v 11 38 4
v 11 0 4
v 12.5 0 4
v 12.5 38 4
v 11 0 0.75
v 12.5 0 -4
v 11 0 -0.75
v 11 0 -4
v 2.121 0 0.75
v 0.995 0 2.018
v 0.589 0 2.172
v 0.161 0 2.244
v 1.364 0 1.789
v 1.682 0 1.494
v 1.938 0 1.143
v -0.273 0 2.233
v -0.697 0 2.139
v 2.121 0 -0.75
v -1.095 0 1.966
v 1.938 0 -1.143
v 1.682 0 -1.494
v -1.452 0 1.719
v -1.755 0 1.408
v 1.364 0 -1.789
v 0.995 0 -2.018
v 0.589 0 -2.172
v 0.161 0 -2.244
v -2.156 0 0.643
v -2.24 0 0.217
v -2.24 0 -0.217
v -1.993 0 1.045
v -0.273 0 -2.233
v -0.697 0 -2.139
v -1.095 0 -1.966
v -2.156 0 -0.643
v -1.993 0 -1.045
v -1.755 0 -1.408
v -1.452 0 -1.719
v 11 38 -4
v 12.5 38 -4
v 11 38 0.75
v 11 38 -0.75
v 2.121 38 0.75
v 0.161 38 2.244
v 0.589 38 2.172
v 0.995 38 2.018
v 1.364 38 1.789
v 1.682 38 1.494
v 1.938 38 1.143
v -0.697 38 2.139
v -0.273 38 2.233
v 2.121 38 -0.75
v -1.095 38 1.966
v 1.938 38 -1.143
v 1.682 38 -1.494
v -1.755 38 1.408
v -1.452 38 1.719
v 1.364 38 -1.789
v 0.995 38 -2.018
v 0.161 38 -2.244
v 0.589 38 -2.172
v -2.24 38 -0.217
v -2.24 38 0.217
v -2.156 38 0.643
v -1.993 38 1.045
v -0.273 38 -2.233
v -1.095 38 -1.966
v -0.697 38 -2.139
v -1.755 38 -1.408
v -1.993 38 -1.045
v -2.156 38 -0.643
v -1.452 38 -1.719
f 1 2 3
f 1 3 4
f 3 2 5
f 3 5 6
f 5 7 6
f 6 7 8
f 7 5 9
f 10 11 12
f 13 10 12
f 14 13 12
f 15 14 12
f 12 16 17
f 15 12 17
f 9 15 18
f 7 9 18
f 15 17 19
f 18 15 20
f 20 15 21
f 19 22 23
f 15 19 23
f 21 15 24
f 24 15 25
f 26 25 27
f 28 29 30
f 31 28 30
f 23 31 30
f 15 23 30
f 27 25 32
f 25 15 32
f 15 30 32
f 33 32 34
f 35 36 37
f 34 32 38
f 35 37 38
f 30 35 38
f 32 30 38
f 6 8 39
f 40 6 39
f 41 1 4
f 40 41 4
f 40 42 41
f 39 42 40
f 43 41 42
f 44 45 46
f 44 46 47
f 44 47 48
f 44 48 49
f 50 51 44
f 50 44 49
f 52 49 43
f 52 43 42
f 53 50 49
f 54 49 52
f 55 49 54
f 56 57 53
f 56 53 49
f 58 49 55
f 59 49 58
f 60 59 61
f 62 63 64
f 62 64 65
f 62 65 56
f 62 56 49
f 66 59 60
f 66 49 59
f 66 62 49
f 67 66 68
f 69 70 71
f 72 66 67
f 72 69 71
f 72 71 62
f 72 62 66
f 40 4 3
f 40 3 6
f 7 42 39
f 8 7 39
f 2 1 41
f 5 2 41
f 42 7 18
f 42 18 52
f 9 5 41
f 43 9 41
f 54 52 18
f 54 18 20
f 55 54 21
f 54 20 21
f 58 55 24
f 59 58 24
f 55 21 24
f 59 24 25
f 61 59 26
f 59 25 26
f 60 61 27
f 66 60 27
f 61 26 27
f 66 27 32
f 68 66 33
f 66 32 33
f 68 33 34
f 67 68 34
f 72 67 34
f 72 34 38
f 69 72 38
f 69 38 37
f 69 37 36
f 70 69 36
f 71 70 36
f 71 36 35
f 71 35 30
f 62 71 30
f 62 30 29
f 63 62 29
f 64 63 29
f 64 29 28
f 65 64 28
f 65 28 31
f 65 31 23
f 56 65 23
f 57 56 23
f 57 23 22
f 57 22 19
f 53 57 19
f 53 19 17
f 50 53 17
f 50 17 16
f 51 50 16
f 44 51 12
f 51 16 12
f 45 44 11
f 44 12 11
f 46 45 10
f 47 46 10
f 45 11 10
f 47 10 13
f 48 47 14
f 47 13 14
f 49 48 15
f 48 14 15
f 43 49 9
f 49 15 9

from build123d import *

# Parameters (mm, degrees)
SKETCH_1_R           = 2.25
EXTRUDE_1_DEPTH      = 38
SKETCH_2_W           = 1.5
SKETCH_2_H           = 38
EXTRUDE_2_DEPTH      = 8
EXTRUDE_2_DEPTH_BACK = 3
SKETCH_3_W           = 8
SKETCH_3_H           = 38
EXTRUDE_3_DEPTH      = 1.5


with BuildPart() as part:
    # 草圖1 → 填料-伸長1 (new body)
    with BuildSketch(Plane(origin=(0, 0, 0), x_dir=(1, 0, 0), z_dir=(0, 1, 0))):
        Circle(SKETCH_1_R)
    extrude(amount=EXTRUDE_1_DEPTH)

    # 草圖2 → 填料-伸長2 (add, two sides)
    with BuildSketch(Plane(origin=(3, 0, 0), x_dir=(0, 0, -1), z_dir=(1, 0, 0))) as extrude_2_sk:
        with Locations((0, 19)):
            Rectangle(SKETCH_2_W, SKETCH_2_H)
    extrude(amount=EXTRUDE_2_DEPTH)
    extrude(extrude_2_sk.sketch, amount=-EXTRUDE_2_DEPTH_BACK)

    # 草圖3 → 填料-伸長3 (add)
    with BuildSketch(Plane(origin=(11, 0, 0), x_dir=(0, 0, -1), z_dir=(1, 0, 0))):
        with Locations((0, 19)):
            Rectangle(SKETCH_3_W, SKETCH_3_H)
    extrude(amount=EXTRUDE_3_DEPTH)


solid = part.part
